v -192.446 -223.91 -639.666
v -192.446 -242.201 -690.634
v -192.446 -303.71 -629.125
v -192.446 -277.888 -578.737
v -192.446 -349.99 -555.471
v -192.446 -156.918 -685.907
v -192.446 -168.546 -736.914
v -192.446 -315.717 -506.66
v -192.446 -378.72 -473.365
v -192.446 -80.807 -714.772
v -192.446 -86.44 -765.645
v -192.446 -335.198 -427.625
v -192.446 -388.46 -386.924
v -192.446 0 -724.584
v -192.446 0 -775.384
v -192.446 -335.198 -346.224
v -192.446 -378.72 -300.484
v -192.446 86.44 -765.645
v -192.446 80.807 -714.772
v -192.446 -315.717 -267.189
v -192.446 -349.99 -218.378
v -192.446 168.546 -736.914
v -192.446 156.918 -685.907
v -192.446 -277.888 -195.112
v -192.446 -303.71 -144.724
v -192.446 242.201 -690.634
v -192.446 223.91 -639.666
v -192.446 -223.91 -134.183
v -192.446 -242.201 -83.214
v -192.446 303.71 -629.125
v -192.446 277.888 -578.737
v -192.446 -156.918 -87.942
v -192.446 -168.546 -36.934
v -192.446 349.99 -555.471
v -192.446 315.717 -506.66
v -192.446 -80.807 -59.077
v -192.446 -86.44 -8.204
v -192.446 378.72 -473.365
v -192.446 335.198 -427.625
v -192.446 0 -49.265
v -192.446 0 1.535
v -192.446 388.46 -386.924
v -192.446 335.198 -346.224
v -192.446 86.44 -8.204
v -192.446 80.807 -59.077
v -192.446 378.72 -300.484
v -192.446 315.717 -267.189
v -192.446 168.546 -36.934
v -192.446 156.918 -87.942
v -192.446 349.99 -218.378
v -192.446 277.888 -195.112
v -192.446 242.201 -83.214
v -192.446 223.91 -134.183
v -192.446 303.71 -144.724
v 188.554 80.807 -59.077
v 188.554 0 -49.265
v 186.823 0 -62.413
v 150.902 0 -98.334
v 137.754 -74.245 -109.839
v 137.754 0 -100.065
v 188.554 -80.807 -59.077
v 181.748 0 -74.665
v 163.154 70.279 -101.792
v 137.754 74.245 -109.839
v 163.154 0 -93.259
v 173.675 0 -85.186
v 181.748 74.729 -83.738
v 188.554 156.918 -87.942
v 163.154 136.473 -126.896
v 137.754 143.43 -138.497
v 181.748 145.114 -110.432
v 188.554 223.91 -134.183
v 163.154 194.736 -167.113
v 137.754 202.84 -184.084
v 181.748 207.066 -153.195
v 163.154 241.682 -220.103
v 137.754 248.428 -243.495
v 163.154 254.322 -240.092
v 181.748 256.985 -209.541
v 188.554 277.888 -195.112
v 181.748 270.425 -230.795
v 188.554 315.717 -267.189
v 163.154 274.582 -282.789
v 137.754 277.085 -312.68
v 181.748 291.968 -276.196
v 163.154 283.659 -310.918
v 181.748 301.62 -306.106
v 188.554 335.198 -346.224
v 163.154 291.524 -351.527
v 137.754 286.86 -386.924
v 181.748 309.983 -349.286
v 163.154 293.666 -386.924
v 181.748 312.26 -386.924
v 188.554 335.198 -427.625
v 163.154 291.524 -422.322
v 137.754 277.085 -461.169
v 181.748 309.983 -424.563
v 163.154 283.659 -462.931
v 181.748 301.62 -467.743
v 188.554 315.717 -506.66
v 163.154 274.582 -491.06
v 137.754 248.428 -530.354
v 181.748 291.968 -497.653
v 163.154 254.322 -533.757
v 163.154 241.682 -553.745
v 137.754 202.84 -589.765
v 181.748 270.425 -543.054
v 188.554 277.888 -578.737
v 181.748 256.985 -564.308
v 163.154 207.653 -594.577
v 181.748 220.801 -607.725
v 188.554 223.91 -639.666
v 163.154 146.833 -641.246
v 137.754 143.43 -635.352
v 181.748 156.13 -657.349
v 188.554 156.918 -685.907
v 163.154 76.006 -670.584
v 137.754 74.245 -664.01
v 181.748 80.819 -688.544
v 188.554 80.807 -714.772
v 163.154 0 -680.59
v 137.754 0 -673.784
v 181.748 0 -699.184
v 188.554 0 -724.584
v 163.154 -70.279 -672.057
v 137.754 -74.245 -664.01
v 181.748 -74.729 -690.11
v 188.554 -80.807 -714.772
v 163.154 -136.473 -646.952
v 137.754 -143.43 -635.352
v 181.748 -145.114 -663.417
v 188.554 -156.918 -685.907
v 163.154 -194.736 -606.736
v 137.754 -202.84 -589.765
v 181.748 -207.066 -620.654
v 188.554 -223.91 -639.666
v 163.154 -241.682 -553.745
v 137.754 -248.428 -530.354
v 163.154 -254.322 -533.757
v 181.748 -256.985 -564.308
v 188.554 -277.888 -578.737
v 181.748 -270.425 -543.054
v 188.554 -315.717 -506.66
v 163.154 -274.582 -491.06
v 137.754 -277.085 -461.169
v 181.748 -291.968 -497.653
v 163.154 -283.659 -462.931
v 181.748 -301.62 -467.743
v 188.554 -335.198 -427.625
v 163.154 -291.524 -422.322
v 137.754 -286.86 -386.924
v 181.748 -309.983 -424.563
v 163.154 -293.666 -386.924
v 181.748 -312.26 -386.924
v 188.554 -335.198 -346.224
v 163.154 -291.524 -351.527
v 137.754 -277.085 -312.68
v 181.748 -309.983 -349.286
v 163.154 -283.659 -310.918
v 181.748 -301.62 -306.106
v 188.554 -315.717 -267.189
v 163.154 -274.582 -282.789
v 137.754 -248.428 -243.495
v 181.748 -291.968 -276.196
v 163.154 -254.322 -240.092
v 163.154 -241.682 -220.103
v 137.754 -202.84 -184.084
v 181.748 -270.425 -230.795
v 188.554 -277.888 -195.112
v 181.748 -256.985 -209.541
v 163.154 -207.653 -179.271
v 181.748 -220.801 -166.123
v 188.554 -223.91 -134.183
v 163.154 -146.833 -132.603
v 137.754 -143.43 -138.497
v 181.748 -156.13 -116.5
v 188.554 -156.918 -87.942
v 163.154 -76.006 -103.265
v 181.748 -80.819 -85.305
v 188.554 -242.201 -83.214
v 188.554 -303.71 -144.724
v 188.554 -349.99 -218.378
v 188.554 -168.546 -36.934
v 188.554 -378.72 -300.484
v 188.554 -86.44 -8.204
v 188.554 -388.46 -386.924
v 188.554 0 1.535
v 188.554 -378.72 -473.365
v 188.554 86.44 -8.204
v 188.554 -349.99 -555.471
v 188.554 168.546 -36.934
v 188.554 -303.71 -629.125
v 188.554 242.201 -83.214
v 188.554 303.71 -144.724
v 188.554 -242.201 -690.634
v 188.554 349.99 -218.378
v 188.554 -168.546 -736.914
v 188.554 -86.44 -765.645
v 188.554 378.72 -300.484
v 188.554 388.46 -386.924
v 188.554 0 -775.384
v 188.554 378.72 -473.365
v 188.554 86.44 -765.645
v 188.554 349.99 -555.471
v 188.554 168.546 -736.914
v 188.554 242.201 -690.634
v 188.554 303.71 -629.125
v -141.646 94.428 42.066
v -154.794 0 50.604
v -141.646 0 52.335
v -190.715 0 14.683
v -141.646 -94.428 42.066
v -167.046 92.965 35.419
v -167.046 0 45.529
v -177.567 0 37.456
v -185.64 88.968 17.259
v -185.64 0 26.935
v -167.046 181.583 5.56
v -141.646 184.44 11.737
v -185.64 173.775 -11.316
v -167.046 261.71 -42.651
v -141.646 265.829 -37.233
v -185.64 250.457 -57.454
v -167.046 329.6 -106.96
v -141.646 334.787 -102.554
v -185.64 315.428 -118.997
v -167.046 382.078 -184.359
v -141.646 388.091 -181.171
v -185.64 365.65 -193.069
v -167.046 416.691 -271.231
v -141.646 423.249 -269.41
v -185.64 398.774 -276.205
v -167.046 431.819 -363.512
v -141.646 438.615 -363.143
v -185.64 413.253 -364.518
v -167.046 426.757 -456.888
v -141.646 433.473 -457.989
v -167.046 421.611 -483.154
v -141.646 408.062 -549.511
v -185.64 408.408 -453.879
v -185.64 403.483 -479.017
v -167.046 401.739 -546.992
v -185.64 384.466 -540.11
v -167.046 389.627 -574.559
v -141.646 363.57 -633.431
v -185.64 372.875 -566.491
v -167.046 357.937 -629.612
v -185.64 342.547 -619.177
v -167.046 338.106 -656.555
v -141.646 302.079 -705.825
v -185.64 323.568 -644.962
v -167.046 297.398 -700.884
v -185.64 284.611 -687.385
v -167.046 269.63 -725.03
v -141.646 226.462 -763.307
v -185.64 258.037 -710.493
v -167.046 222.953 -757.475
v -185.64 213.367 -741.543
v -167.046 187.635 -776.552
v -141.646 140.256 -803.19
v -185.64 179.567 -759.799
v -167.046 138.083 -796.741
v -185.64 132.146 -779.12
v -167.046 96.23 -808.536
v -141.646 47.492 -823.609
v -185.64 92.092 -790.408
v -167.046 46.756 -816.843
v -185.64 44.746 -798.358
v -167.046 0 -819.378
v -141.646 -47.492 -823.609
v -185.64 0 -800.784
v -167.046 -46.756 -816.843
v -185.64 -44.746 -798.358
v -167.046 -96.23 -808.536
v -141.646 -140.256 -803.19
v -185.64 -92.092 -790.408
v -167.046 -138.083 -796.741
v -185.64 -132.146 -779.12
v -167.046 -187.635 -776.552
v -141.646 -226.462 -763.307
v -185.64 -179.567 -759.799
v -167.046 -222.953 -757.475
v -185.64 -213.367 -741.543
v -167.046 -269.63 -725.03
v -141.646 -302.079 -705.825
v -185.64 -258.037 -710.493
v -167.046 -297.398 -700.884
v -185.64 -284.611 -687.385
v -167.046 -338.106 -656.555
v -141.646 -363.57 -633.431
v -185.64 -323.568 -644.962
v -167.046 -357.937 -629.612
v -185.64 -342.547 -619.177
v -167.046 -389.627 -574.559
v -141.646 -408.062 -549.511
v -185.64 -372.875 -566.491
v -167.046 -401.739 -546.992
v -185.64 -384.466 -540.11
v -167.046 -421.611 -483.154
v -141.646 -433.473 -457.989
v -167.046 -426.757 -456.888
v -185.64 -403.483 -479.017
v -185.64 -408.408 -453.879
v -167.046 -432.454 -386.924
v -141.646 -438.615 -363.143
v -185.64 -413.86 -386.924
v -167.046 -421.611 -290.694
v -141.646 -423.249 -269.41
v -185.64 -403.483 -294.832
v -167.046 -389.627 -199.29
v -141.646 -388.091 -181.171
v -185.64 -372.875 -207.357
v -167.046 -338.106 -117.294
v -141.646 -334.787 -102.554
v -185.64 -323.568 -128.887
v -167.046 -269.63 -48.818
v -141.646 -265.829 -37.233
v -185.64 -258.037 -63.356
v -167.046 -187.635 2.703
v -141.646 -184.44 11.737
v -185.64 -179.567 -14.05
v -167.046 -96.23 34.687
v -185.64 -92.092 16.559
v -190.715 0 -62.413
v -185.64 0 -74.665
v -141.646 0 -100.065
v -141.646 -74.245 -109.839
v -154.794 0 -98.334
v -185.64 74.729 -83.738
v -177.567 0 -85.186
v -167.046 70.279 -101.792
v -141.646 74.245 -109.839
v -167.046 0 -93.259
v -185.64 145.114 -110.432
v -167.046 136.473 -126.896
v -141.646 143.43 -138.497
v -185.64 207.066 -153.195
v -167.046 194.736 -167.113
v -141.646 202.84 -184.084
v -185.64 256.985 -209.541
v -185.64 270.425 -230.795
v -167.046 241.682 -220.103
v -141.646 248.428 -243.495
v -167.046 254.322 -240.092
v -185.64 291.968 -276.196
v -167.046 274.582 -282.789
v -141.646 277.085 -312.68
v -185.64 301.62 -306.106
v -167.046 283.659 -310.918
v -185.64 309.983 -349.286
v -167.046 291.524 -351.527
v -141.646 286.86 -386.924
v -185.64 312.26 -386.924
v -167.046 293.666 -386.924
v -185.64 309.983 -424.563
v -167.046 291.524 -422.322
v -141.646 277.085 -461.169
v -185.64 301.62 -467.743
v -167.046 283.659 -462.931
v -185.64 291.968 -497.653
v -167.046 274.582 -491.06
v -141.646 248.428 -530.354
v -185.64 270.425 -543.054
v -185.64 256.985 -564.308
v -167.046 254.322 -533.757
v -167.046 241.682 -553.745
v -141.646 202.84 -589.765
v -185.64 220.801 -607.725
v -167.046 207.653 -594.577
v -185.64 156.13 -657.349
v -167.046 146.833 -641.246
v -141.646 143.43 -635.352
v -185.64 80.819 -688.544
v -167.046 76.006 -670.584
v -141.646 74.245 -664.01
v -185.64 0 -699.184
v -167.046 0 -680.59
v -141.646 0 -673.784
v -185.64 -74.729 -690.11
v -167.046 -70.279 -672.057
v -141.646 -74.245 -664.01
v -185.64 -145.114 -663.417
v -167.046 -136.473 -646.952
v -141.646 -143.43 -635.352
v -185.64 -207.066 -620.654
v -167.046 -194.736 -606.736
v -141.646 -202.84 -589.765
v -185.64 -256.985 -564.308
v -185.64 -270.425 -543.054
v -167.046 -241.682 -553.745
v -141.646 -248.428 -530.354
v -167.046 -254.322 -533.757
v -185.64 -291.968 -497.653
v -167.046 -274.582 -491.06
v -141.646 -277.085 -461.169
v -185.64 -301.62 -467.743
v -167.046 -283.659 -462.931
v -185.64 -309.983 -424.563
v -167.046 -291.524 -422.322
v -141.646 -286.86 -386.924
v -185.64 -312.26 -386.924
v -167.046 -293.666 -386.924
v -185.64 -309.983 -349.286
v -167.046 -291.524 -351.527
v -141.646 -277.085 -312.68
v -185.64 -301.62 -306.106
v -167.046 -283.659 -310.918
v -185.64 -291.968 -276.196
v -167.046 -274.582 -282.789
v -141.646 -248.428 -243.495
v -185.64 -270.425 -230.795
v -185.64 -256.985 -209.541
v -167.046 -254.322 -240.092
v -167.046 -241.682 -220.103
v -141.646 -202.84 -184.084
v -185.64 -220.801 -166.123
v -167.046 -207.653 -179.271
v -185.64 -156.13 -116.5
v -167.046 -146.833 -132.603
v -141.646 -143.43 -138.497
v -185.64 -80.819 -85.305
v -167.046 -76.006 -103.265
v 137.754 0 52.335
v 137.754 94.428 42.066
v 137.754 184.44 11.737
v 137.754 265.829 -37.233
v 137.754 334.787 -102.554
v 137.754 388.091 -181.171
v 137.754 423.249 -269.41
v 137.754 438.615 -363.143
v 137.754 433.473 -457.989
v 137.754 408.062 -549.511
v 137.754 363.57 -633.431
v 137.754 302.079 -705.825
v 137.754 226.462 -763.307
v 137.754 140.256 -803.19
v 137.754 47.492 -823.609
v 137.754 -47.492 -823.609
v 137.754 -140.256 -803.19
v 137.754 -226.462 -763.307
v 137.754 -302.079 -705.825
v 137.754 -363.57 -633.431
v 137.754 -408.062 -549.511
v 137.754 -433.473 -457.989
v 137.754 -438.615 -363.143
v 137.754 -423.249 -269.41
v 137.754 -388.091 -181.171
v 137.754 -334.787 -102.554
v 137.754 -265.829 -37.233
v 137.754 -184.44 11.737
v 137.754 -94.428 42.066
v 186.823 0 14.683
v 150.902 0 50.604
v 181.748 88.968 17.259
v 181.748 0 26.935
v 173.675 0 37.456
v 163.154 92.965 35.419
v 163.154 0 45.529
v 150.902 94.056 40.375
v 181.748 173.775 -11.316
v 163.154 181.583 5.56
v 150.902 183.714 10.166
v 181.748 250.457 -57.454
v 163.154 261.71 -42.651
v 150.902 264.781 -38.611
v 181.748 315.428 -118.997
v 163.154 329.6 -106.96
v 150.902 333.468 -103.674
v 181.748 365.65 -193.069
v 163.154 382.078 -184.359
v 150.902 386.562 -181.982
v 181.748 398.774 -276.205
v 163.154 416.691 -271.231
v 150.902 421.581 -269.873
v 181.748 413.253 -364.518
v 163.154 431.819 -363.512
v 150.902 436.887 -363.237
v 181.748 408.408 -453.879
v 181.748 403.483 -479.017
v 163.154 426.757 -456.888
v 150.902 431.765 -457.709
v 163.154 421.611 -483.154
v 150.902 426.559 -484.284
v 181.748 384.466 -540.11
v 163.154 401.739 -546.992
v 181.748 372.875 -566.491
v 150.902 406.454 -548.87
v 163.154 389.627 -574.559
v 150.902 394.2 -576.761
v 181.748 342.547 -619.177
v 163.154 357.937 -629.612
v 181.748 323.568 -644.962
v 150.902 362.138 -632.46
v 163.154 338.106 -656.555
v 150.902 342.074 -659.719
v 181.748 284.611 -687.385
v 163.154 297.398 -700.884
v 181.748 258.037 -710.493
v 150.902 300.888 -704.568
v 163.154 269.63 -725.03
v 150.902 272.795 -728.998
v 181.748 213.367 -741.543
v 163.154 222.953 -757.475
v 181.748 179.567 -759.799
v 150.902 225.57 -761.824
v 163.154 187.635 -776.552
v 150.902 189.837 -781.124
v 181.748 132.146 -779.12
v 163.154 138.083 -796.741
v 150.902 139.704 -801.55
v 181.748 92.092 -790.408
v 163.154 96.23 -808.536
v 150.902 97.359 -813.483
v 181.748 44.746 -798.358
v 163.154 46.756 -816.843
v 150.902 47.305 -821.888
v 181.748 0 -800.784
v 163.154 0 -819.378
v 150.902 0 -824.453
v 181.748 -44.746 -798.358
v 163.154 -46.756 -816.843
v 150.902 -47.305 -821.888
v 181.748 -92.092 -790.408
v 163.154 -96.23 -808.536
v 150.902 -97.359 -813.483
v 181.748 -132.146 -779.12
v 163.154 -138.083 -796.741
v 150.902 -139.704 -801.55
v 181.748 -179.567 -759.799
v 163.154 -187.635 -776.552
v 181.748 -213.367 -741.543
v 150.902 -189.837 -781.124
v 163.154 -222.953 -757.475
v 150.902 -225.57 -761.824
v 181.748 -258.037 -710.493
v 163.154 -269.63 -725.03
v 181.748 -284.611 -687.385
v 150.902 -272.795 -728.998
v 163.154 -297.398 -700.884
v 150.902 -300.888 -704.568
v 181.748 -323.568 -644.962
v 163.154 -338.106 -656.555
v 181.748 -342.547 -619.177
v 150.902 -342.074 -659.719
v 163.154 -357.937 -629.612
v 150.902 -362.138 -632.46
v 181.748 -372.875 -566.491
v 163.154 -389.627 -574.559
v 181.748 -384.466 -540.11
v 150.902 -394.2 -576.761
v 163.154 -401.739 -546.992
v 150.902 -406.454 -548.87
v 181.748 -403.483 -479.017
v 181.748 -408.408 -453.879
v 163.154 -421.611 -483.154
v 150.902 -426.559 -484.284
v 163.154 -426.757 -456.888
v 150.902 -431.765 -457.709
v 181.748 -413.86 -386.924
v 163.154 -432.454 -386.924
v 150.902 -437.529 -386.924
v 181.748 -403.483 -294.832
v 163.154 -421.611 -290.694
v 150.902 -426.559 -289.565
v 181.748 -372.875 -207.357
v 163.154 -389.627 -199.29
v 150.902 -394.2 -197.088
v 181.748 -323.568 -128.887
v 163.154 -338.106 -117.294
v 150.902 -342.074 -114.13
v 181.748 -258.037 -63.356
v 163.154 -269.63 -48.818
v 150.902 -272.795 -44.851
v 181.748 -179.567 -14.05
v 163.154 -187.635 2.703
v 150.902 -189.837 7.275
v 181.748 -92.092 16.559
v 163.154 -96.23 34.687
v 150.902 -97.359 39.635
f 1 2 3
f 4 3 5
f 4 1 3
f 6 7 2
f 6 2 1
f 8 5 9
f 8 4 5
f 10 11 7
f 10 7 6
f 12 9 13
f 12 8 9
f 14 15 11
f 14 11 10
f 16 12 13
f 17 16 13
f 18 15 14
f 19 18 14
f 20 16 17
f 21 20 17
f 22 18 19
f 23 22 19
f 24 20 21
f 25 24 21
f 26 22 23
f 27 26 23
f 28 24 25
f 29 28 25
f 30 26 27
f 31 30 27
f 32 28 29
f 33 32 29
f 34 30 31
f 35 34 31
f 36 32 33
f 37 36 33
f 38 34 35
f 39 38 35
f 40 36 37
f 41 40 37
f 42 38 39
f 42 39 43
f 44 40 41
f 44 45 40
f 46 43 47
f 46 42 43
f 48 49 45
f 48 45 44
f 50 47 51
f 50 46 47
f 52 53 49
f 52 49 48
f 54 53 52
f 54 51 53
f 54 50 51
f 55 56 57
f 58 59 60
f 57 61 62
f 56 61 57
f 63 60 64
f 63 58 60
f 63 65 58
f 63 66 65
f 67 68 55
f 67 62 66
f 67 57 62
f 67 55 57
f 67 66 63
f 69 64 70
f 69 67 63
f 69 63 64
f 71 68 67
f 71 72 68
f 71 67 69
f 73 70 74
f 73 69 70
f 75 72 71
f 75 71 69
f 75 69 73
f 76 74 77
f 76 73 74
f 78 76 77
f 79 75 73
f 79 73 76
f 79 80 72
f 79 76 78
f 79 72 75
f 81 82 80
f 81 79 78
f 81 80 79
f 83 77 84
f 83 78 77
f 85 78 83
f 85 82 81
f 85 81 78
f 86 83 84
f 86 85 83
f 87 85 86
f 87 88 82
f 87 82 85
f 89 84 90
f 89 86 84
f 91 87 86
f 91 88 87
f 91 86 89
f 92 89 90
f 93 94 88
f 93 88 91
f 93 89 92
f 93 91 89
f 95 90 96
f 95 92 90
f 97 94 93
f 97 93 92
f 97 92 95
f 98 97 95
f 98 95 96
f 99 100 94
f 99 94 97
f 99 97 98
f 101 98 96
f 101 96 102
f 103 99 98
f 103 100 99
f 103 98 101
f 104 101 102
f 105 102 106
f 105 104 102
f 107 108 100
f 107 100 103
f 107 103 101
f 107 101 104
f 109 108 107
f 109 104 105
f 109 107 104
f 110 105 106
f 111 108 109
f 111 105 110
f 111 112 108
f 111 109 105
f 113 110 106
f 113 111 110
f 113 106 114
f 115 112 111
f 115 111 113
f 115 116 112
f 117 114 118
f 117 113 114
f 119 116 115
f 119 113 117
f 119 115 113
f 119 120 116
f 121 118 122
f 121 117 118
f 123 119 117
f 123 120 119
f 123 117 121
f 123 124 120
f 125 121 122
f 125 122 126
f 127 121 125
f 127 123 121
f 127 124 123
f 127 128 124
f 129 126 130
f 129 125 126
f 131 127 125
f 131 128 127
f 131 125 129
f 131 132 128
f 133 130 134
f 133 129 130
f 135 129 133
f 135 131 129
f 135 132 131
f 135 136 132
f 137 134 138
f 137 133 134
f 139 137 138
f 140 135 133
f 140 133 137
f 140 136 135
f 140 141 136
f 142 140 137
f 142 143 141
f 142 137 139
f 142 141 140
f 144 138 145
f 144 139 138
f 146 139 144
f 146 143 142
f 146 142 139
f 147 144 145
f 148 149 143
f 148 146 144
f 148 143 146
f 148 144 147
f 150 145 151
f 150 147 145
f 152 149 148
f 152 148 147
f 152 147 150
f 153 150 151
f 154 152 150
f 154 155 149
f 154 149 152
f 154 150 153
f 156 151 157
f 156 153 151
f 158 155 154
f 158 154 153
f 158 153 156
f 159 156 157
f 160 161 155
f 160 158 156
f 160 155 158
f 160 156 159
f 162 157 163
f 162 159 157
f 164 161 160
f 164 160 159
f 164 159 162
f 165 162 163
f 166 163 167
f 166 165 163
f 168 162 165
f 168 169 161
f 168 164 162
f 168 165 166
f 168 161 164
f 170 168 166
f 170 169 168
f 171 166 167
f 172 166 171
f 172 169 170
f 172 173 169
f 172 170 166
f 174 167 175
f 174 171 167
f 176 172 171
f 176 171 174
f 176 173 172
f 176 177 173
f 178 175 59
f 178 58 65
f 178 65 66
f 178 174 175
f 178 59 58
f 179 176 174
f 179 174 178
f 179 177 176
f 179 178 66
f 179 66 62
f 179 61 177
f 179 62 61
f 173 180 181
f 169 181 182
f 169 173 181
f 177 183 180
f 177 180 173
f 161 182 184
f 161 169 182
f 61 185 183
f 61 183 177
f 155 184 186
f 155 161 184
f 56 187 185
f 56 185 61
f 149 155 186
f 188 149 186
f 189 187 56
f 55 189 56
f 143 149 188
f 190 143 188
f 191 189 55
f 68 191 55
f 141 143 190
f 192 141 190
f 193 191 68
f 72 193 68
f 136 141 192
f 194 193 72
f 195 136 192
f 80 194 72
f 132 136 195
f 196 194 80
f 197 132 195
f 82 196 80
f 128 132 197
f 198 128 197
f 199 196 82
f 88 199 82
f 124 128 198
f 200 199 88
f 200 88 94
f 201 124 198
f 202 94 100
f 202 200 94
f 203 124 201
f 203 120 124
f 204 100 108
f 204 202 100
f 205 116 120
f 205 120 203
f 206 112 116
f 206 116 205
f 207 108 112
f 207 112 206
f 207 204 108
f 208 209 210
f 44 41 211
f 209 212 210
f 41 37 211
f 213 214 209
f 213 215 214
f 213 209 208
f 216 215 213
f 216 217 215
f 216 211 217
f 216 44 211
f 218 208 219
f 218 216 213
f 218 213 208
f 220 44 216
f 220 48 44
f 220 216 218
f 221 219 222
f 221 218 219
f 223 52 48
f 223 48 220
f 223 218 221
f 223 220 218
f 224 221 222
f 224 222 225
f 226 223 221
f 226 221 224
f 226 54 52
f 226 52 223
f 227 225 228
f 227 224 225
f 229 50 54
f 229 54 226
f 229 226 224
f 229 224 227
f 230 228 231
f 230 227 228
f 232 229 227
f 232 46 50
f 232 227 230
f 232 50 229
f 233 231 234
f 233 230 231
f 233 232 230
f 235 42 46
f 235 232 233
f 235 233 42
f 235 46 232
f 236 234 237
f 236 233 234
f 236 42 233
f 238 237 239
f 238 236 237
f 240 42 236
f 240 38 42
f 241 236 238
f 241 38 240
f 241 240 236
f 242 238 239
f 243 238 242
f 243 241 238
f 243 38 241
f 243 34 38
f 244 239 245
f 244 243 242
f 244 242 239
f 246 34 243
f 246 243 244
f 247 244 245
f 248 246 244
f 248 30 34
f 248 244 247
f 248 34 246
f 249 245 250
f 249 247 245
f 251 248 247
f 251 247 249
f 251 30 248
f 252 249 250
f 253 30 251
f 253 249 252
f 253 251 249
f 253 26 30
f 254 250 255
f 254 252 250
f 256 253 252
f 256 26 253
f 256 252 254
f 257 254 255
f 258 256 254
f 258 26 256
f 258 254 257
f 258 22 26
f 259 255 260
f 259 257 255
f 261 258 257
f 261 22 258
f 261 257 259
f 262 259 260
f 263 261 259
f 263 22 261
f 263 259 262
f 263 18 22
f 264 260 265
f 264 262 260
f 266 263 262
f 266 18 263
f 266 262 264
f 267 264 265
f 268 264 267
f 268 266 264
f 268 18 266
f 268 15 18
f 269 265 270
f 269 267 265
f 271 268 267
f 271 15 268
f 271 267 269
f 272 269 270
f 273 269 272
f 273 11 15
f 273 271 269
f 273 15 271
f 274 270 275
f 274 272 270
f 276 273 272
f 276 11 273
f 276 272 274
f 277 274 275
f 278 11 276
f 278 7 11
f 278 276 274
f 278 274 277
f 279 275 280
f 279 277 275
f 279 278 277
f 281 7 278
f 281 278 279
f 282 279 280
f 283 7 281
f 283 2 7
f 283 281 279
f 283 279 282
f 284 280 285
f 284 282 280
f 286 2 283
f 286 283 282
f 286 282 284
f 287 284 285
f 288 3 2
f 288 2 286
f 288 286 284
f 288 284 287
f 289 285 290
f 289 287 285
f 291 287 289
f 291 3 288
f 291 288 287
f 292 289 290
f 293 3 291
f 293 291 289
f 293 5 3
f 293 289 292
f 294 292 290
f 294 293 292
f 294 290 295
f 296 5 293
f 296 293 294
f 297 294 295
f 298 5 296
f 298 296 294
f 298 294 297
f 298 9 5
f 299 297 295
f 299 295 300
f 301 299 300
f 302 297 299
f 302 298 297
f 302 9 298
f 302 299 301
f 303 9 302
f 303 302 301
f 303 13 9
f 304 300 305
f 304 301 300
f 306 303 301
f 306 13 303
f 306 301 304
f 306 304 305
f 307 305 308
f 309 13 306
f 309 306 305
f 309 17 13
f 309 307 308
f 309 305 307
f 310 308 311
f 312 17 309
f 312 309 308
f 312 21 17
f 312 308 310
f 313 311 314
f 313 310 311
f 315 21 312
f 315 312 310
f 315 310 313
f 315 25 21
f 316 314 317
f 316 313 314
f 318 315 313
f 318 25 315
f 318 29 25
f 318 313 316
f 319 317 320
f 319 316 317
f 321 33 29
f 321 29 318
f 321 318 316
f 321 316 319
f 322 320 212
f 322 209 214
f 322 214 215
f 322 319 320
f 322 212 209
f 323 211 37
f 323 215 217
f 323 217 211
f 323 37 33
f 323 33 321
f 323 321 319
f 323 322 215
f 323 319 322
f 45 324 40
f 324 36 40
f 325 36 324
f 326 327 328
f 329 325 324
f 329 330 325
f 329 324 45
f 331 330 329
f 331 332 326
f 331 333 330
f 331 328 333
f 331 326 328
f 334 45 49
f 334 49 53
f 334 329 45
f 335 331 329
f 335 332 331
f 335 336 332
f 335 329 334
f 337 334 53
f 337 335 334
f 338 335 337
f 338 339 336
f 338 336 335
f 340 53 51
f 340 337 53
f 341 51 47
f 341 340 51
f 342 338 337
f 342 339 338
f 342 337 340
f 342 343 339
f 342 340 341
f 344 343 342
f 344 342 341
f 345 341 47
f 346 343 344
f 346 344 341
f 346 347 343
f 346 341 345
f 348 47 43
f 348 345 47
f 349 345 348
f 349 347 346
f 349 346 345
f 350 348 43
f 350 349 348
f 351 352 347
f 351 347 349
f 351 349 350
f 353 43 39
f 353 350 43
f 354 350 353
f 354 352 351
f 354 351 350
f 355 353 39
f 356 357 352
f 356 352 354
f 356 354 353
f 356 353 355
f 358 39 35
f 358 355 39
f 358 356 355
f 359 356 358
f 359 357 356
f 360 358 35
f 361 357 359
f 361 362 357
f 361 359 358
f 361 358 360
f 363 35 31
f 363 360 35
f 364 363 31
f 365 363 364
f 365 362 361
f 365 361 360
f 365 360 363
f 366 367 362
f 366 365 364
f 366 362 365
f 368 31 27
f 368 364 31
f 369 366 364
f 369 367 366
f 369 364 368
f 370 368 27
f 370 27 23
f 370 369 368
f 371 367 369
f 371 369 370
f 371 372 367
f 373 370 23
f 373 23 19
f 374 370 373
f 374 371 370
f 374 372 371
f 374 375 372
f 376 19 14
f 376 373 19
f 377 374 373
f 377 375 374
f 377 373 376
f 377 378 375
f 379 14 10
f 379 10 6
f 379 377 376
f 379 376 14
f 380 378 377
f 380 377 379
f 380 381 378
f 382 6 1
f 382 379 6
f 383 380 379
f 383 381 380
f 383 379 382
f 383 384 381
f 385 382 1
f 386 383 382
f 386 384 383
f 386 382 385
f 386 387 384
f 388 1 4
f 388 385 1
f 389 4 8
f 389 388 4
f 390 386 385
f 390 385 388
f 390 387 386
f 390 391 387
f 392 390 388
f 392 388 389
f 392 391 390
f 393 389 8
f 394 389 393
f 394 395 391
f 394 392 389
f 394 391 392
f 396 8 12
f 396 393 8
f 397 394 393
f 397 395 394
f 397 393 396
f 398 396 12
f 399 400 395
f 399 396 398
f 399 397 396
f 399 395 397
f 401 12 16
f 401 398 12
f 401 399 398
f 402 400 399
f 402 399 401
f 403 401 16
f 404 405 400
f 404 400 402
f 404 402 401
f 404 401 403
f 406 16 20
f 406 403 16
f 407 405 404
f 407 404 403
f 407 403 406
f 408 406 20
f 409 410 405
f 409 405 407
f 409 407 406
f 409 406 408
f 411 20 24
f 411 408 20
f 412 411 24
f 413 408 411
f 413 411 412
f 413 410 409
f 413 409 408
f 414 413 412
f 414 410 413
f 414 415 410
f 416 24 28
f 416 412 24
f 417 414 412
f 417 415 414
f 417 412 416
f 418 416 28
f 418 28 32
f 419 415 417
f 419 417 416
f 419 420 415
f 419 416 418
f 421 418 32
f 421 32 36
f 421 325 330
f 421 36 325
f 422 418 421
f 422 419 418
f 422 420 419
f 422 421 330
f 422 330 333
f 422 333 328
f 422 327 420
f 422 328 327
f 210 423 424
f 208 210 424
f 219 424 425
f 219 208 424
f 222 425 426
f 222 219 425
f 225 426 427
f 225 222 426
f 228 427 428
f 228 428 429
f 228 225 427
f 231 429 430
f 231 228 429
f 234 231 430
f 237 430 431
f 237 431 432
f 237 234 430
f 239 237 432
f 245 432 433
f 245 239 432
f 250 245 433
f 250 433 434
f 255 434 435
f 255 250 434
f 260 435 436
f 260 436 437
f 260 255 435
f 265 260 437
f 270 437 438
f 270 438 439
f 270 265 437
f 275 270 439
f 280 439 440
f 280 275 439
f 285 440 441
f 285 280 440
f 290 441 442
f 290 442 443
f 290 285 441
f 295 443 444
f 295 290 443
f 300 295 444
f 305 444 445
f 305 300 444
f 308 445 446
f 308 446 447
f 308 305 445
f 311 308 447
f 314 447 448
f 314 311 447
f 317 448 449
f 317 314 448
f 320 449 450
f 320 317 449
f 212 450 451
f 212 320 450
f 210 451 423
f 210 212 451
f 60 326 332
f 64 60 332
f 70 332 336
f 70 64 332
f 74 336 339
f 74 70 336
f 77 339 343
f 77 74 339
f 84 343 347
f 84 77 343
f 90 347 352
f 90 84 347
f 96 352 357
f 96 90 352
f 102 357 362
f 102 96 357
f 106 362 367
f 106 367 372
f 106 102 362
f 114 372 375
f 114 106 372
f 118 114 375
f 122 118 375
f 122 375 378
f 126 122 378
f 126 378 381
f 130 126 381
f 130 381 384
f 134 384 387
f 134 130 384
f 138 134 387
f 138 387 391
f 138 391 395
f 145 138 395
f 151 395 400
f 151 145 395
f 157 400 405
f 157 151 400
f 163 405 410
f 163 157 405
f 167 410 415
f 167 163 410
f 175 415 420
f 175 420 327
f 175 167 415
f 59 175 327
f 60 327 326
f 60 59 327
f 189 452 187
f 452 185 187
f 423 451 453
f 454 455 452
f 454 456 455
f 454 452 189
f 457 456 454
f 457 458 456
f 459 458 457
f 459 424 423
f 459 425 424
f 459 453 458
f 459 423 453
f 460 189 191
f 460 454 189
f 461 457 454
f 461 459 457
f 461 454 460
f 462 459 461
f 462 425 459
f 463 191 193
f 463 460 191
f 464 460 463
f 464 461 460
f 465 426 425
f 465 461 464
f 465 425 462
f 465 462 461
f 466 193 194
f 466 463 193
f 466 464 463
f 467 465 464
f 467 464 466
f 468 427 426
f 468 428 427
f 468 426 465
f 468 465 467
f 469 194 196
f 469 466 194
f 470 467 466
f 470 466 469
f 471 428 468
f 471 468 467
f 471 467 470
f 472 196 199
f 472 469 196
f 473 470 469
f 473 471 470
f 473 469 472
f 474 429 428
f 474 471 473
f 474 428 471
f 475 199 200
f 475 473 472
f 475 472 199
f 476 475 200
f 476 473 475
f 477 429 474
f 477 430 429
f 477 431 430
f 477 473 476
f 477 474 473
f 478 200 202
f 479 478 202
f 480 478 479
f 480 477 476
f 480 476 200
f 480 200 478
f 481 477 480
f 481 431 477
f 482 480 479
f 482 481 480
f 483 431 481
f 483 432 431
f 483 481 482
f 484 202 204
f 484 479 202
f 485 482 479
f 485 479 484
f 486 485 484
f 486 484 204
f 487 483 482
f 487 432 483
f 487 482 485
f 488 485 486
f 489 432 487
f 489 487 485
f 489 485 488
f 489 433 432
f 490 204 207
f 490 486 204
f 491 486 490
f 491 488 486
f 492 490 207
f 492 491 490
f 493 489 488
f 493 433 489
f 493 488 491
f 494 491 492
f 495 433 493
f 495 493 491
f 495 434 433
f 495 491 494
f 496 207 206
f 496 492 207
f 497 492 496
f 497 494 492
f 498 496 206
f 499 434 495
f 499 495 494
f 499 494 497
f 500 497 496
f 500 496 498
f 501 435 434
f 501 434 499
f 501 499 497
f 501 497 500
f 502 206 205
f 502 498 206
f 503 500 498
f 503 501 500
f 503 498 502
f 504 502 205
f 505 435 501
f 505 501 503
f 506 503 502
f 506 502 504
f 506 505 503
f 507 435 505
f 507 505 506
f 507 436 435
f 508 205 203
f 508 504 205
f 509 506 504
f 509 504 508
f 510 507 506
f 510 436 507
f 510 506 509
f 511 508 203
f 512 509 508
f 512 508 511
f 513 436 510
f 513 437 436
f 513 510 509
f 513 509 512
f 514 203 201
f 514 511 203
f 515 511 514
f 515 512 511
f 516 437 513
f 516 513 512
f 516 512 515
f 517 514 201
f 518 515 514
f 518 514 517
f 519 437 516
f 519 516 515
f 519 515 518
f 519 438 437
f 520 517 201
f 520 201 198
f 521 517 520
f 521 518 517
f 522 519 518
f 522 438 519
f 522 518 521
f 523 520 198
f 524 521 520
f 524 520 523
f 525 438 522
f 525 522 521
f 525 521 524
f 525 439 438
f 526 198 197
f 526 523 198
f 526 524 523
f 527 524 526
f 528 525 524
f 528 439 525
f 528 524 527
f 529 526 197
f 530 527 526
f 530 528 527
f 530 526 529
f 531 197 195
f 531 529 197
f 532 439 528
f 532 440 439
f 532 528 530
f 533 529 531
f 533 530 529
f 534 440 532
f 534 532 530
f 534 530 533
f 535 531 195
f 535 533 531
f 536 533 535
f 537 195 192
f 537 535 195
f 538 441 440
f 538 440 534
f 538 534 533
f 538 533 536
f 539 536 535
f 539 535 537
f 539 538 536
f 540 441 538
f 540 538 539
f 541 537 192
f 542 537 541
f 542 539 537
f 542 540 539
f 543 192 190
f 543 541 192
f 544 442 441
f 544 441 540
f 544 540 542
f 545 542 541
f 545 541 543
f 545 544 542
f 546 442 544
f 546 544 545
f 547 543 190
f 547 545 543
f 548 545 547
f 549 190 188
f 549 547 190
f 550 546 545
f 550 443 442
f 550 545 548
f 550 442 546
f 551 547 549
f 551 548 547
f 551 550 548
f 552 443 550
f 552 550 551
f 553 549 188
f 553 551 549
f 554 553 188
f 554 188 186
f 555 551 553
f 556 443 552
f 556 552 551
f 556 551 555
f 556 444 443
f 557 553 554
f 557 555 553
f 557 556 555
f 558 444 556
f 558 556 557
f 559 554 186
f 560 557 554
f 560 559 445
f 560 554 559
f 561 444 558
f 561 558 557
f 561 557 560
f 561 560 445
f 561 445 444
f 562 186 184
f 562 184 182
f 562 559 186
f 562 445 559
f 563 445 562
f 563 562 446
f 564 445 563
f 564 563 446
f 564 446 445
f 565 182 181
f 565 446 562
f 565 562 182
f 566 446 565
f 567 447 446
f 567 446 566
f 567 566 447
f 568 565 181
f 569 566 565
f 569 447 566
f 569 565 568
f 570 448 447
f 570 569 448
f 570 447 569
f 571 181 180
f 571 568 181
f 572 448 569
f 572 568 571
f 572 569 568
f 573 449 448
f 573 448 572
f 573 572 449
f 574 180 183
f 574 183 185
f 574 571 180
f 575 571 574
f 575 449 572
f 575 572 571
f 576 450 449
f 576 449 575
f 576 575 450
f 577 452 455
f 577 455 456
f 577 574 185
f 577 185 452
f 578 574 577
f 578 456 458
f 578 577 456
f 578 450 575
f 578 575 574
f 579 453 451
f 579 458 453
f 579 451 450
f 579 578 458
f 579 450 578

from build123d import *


# Not quite as in the source:
# - the program builds the solid bodies; features that only make, move or delete a surface that nothing else refers to are left out


with BuildPart() as f4:
    # F0 (on Front) → F4 (revolve)
    with BuildSketch(Plane.XZ):
        with BuildLine():
            ThreePointArc((-192.4457153976, -49.2647496334), (-177.5667398819, -85.1857741176), (-141.6457153976, -100.0647496334))
            Line((-141.6457153976, -100.0647496334), (137.7542846024, -100.0647496334))
            ThreePointArc((137.7542846024, -100.0647496334), (173.6753090867, -85.1857741176), (188.5542846024, -49.2647496334))
            Line((188.5542846024, -49.2647496334), (188.5542846024, 1.5352503666))
            ThreePointArc((188.5542846024, 1.5352503666), (173.6753090867, 37.4562748509), (137.7542846024, 52.3352503666))
            Line((137.7542846024, 52.3352503666), (-141.6457153976, 52.3352503666))
            ThreePointArc((-141.6457153976, 52.3352503666), (-177.5667398819, 37.4562748509), (-192.4457153976, 1.5352503666))
            Line((-192.4457153976, 1.5352503666), (-192.4457153976, -49.2647496334))
        make_face()
    revolve(axis=Axis((-11.0372006893, 0, -386.9243860245), (-1, 0, 0)))


solid = f4.part
